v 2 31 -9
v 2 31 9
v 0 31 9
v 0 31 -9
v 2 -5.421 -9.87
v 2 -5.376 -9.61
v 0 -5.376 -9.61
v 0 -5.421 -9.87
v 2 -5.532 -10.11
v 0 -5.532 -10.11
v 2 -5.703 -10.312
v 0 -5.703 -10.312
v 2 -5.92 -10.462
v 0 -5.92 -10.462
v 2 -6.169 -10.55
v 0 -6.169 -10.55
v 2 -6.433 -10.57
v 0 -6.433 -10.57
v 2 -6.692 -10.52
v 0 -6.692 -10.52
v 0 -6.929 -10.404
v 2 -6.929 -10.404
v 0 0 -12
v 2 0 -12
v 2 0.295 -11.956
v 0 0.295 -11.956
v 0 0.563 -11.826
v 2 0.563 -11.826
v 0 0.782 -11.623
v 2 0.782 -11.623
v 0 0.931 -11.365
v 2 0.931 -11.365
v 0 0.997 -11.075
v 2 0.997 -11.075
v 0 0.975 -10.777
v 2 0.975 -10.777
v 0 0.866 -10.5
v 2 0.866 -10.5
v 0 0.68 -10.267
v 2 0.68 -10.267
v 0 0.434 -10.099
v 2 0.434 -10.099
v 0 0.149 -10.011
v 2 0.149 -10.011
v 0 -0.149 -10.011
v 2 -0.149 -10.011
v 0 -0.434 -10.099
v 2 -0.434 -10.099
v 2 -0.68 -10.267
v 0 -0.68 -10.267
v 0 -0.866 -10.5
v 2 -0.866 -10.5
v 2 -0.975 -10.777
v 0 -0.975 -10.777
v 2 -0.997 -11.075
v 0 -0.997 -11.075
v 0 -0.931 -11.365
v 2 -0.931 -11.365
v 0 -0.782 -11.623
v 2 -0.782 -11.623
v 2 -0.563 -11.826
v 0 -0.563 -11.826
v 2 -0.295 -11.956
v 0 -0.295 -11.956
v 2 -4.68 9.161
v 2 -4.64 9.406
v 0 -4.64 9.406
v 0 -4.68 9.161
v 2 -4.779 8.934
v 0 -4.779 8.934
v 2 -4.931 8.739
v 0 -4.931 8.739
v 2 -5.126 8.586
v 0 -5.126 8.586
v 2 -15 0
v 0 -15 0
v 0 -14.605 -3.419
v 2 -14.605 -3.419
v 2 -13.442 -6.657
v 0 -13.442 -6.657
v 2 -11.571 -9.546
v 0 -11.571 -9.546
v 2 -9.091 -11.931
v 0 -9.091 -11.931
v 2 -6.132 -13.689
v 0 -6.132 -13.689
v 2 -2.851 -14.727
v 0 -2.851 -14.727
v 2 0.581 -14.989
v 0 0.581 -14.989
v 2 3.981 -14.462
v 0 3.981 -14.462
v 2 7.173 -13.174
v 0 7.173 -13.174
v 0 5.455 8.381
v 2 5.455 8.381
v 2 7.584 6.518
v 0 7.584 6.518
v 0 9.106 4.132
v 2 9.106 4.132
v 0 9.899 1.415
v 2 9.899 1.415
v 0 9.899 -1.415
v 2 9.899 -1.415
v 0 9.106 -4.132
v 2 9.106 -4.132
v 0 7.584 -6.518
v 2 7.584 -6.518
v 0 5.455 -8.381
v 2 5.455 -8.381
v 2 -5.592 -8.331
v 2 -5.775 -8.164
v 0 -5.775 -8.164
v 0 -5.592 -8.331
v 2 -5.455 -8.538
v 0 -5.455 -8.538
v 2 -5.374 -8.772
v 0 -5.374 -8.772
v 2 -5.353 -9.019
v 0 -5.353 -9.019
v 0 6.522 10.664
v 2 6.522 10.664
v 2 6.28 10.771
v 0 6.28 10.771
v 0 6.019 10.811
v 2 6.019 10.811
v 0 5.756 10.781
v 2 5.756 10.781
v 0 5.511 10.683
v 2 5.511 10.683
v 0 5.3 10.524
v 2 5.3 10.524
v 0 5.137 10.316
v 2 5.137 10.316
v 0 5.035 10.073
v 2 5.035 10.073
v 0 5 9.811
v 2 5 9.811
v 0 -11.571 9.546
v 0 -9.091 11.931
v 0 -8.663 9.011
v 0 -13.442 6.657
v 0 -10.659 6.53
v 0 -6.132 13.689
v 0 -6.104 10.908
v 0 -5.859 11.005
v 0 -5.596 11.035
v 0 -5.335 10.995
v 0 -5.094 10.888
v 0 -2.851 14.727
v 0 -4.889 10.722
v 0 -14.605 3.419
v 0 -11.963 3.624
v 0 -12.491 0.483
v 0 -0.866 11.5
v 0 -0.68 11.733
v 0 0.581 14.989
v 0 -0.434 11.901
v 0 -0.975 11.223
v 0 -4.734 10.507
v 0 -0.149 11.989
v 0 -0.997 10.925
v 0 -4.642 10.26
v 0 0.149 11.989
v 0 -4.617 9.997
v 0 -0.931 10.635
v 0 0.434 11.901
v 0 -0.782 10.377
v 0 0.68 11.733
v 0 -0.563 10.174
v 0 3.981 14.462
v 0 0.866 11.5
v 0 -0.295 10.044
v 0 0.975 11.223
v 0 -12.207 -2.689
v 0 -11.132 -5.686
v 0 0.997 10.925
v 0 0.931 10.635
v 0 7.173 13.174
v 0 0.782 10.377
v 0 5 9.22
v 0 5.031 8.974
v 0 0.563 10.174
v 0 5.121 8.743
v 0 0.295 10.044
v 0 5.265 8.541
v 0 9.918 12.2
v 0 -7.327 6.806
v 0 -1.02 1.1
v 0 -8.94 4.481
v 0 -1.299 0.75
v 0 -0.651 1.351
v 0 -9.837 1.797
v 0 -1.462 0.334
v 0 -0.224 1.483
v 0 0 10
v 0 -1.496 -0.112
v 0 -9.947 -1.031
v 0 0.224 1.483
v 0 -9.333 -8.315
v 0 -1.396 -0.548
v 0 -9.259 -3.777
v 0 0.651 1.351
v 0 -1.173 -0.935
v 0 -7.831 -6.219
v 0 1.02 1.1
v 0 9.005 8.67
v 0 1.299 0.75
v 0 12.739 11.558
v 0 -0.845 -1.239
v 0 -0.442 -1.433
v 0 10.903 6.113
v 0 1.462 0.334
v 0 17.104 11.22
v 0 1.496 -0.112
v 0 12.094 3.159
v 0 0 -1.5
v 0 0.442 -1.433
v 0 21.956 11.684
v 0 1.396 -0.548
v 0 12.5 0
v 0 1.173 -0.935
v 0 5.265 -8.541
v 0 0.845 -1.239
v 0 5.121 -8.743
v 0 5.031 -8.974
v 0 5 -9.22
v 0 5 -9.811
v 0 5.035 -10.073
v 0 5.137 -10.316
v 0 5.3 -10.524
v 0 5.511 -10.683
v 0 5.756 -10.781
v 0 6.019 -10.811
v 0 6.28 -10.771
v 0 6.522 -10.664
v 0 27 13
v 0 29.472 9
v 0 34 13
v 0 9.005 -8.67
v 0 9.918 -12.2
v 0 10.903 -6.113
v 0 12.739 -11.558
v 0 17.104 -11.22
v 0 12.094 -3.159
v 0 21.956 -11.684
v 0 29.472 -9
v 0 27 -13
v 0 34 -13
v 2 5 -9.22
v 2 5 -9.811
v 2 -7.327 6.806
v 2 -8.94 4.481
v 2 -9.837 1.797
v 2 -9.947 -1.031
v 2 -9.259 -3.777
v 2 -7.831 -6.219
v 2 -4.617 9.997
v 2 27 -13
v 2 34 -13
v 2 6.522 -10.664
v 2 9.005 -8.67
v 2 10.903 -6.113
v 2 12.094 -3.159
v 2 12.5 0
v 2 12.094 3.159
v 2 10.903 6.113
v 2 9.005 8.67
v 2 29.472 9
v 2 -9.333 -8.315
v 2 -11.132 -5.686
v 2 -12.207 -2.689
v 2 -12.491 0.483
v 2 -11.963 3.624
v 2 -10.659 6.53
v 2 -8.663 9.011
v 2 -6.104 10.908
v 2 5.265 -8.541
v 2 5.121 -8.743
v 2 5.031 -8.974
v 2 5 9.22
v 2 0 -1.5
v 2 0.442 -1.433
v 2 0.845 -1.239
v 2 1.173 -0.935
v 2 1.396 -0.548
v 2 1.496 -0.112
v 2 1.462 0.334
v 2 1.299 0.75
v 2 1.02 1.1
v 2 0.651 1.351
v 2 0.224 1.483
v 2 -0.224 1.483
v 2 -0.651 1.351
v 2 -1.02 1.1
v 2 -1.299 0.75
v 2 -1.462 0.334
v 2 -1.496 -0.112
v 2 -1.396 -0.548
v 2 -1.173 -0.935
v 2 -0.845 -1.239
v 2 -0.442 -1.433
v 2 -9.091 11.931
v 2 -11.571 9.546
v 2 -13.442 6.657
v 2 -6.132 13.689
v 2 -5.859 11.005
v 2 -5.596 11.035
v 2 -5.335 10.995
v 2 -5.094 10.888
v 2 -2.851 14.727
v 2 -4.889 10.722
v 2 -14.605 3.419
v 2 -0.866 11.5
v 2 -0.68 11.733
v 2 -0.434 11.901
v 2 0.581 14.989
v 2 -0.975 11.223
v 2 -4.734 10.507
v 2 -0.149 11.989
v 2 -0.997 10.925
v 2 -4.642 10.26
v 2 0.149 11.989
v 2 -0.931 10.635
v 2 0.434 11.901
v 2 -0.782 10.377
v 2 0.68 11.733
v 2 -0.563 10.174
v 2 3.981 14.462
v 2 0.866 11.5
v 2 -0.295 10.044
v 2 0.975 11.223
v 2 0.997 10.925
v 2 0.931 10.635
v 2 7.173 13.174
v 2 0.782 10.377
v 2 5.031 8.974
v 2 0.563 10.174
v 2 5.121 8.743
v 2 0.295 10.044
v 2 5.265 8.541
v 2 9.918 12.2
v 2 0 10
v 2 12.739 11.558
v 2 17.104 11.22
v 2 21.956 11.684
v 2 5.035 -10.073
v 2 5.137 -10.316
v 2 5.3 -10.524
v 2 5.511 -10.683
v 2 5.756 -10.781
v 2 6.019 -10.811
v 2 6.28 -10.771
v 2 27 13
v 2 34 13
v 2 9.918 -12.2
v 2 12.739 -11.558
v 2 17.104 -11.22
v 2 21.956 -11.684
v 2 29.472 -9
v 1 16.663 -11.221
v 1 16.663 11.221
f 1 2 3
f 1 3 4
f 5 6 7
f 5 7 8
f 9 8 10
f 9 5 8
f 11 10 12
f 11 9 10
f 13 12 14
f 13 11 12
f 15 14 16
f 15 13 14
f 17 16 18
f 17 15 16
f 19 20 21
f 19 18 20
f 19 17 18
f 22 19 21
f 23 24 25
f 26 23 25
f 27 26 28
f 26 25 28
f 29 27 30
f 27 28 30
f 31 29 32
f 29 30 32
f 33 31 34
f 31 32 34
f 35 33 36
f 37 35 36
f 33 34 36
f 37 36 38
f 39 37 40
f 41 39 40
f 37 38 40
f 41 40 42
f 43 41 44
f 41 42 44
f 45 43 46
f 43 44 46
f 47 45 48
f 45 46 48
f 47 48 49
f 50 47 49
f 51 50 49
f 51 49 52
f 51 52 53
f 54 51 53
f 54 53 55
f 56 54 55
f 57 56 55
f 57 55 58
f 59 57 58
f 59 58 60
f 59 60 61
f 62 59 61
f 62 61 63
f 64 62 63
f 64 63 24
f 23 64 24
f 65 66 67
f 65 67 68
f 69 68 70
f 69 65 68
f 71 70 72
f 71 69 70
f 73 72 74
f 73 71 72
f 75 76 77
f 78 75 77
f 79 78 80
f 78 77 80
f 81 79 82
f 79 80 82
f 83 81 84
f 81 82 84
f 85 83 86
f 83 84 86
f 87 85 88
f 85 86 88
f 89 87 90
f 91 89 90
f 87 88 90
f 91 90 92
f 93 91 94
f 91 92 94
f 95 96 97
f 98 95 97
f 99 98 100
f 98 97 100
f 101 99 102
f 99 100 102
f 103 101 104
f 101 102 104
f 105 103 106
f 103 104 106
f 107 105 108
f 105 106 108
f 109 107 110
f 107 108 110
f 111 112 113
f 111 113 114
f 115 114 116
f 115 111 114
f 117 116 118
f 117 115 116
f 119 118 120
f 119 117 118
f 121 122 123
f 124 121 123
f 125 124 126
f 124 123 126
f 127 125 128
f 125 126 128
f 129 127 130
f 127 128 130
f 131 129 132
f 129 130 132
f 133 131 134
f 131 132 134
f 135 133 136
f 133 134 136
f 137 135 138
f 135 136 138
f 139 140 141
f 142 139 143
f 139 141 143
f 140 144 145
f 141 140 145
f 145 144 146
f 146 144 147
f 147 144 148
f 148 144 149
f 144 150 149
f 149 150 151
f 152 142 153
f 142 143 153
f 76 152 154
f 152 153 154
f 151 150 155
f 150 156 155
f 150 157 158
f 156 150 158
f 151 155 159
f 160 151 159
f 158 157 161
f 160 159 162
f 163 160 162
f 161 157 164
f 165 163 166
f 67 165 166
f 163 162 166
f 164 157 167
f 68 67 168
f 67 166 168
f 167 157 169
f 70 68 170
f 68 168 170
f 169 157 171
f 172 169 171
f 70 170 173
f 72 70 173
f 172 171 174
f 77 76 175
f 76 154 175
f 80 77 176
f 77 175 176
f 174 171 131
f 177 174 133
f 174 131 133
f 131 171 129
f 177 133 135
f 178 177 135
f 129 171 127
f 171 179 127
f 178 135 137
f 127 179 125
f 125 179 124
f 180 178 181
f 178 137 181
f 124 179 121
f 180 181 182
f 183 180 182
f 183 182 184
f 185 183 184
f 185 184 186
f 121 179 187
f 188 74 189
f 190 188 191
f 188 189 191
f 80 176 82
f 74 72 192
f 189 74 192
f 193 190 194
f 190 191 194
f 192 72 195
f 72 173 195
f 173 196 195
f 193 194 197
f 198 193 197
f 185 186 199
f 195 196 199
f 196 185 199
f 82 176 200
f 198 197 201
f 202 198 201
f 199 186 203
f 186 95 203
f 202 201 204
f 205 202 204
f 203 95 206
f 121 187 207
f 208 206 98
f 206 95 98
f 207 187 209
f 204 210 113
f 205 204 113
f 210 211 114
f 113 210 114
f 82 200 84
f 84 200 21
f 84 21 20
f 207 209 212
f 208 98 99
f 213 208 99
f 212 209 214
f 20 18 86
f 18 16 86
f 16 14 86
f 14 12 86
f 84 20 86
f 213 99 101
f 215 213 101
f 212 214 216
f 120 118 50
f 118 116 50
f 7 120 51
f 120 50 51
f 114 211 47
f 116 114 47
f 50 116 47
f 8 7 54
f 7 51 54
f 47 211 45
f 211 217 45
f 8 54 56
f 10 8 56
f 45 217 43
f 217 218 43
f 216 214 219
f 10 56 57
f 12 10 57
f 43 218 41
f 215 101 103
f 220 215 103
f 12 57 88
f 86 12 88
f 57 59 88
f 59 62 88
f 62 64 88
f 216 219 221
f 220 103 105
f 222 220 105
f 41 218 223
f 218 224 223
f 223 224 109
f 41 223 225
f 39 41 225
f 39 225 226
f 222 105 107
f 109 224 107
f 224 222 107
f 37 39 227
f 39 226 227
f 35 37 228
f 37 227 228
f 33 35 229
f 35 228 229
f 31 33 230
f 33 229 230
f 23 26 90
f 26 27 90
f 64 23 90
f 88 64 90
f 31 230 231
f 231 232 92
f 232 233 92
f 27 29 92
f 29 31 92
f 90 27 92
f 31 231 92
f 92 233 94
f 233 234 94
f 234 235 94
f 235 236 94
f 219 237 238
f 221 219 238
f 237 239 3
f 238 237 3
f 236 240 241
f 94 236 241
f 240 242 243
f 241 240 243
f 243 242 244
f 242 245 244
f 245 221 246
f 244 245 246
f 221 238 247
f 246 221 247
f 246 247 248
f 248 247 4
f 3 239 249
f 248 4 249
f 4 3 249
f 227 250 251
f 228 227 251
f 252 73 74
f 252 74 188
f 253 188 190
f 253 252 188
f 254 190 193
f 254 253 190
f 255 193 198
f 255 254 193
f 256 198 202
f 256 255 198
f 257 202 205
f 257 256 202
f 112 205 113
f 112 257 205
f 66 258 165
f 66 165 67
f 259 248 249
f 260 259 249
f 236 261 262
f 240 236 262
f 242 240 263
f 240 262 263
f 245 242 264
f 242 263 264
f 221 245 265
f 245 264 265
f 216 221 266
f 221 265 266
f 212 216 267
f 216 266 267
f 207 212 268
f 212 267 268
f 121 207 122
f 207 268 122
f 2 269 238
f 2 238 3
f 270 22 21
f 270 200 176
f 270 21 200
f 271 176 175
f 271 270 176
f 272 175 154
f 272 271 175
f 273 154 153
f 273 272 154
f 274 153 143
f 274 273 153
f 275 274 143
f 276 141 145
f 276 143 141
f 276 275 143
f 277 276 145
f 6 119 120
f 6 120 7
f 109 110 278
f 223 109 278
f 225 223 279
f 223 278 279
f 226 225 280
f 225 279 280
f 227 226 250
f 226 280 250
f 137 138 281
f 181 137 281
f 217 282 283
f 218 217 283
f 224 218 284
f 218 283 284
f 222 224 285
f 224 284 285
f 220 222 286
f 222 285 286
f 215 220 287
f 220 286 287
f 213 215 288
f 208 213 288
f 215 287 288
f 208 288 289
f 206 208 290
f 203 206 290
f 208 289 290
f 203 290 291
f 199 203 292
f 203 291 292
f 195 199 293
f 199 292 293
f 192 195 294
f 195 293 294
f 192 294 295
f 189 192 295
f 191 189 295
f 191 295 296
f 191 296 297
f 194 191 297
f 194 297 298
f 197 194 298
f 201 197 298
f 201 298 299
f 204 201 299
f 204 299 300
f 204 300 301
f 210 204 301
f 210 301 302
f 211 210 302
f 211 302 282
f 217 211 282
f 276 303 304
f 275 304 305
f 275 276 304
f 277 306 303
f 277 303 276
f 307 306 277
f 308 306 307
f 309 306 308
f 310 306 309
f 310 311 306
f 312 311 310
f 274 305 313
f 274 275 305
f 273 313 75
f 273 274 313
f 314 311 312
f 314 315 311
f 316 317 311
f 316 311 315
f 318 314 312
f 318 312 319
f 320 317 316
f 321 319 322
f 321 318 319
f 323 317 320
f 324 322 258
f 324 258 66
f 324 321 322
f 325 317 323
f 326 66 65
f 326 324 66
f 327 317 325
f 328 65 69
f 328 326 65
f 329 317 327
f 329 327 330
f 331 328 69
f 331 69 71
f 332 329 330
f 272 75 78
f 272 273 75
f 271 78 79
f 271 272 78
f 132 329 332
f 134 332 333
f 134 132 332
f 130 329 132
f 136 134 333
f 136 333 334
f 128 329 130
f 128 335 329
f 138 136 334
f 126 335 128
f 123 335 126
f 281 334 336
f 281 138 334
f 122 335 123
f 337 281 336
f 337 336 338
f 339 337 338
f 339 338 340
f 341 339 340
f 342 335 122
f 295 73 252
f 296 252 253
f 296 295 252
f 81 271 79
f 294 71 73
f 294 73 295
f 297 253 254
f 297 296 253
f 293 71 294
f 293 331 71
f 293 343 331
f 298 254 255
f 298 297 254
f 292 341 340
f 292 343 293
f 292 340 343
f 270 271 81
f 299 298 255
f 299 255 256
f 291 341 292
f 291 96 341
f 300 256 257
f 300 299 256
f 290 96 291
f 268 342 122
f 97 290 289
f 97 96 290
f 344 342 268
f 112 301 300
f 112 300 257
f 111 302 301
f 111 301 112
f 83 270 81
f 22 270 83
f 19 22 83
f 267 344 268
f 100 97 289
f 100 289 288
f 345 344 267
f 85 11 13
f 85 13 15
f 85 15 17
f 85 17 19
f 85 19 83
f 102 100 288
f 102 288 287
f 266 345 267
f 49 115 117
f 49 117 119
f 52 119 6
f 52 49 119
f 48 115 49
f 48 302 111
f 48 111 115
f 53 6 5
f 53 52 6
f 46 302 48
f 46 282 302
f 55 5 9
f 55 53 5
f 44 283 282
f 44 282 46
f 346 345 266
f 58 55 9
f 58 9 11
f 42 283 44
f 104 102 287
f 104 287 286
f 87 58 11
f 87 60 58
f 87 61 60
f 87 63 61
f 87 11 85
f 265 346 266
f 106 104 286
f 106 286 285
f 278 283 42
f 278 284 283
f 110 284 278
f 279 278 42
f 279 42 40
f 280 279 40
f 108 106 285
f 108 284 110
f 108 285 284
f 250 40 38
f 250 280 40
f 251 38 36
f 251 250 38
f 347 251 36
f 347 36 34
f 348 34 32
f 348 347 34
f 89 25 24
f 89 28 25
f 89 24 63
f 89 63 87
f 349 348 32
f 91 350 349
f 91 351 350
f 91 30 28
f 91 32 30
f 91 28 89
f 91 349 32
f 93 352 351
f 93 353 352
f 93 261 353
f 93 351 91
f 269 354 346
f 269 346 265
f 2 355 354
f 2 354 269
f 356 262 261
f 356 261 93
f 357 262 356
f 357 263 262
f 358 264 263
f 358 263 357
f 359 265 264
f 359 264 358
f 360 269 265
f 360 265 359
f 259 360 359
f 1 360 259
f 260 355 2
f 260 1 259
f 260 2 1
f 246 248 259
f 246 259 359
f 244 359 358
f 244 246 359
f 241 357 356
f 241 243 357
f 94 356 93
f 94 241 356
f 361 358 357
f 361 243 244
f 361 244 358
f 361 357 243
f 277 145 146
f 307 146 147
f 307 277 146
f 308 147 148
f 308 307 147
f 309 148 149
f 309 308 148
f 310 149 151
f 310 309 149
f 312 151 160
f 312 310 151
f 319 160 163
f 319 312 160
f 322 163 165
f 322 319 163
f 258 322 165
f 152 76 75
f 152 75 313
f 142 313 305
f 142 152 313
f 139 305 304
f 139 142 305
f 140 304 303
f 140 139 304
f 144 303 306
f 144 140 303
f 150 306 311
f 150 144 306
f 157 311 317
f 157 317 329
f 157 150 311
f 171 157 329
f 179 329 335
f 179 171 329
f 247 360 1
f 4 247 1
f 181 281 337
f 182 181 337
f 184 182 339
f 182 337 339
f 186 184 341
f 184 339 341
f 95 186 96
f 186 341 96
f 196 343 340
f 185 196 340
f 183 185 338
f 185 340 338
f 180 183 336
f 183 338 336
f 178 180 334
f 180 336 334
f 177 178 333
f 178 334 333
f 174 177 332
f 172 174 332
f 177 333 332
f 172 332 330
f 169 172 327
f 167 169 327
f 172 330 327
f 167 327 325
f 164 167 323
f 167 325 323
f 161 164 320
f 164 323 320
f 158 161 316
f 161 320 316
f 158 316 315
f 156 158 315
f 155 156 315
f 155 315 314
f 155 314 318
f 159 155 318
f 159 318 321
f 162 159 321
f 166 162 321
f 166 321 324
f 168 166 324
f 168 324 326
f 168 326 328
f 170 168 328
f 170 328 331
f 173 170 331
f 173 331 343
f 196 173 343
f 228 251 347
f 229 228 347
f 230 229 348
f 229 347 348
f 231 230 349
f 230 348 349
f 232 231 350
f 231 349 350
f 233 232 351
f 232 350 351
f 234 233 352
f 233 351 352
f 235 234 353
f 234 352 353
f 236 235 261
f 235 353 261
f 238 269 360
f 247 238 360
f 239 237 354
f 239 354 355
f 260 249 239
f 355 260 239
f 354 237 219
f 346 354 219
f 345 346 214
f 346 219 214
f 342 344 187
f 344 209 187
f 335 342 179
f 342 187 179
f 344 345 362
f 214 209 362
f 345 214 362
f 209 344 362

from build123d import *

# Parameters (mm, degrees)
RESSALTO_EXTRUS_O1_DEPTH = 2
ESBO_O2_R                = 1.5
ESBO_O2_R_2              = 1
ESBO_O2_W                = 18
ESBO_O2_H                = 1.527880785
CORTE_EXTRUS_O1_DEPTH    = 3.0000001


with BuildPart() as part:
    # Esboço1 → Ressalto-extrusão1 (new body)
    with BuildSketch(Plane(origin=(0, 0, 0), x_dir=(0, 0, -1), z_dir=(1, 0, 0))):
        with BuildLine():
            Line((-13, 34), (0, 34))
            Line((0, 34), (0, -15))
            ThreePointArc((0, -15), (-12.895532653, -7.661934325), (-13.173963237, 7.172634986))
            add(Edge.make_bspline(
                [(-13, 27), (-9.354199414, 16.239964162), (-13.173963237, 7.172634986)],
                knots=[0, 0, 0, 0.912495845, 0.912495845, 0.912495845], degree=2))
            Line((-13, 27), (-13, 34))
        make_face()
    ressalto_extrus_o1 = extrude(amount=RESSALTO_EXTRUS_O1_DEPTH)

    # Espelhar1: Ressalto-extrusão1 across plane
    add(ressalto_extrus_o1.mirror(Plane(origin=(2, 34, 0), x_dir=(1, 0, 0), z_dir=(0, 0, 1))))

    # Esboço2 → Corte-extrusão1 (cut, through all)
    with BuildSketch(Plane(origin=(2, 0, 0), x_dir=(0, 0, -1), z_dir=(1, 0, 0))):
        Circle(ESBO_O2_R)
        with Locations((11, 0)):
            Circle(ESBO_O2_R_2)
        with Locations((-11, 0)):
            Circle(ESBO_O2_R_2)
        with Locations((0, 30.236059608)):
            Rectangle(ESBO_O2_W, ESBO_O2_H)
        with BuildLine():
            Line((-9.810708435, 5), (-9.219544457, 5))
            ThreePointArc((-9.219544457, 5), (-8.742813163, 5.120950927), (-8.381404052, 5.454545455))
            ThreePointArc((-8.381404052, 5.454545455), (0, 10), (8.381404052, 5.454545455))
            ThreePointArc((8.381404052, 5.454545455), (8.742813163, 5.120950927), (9.219544457, 5))
            Line((9.219544457, 5), (9.810708435, 5))
            ThreePointArc((9.810708435, 5), (10.682986811, 5.510990353), (10.663813516, 6.52173913))
            ThreePointArc((10.663813516, 6.52173913), (0, 12.5), (-10.663813516, 6.52173913))
            ThreePointArc((-10.663813516, 6.52173913), (-10.682986811, 5.510990353), (-9.810708435, 5))
        make_face()
        with BuildLine():
            Line((-9.996736389, -4.616845413), (-9.40601466, -4.639707772))
            ThreePointArc((-9.40601466, -4.639707772), (-8.934317599, -4.779005068), (-8.586080114, -5.126326976))
            ThreePointArc((-8.586080114, -5.126326976), (-0.386734657, -9.992519017), (8.164187762, -5.77460286))
            ThreePointArc((8.164187762, -5.77460286), (8.538227759, -5.455234837), (9.019280003, -5.352811245))
            Line((9.019280003, -5.352811245), (9.610001733, -5.375673604))
            ThreePointArc((9.610001733, -5.375673604), (10.461865791, -5.920015714), (10.403617681, -6.929266854))
            ThreePointArc((10.403617681, -6.929266854), (-0.483418321, -12.490648771), (-10.90805419, -6.104453603))
            ThreePointArc((-10.90805419, -6.104453603), (-10.888123983, -5.093719467), (-9.996736389, -4.616845413))
        make_face()
    extrude(amount=-CORTE_EXTRUS_O1_DEPTH, mode=Mode.SUBTRACT)


solid = part.part
